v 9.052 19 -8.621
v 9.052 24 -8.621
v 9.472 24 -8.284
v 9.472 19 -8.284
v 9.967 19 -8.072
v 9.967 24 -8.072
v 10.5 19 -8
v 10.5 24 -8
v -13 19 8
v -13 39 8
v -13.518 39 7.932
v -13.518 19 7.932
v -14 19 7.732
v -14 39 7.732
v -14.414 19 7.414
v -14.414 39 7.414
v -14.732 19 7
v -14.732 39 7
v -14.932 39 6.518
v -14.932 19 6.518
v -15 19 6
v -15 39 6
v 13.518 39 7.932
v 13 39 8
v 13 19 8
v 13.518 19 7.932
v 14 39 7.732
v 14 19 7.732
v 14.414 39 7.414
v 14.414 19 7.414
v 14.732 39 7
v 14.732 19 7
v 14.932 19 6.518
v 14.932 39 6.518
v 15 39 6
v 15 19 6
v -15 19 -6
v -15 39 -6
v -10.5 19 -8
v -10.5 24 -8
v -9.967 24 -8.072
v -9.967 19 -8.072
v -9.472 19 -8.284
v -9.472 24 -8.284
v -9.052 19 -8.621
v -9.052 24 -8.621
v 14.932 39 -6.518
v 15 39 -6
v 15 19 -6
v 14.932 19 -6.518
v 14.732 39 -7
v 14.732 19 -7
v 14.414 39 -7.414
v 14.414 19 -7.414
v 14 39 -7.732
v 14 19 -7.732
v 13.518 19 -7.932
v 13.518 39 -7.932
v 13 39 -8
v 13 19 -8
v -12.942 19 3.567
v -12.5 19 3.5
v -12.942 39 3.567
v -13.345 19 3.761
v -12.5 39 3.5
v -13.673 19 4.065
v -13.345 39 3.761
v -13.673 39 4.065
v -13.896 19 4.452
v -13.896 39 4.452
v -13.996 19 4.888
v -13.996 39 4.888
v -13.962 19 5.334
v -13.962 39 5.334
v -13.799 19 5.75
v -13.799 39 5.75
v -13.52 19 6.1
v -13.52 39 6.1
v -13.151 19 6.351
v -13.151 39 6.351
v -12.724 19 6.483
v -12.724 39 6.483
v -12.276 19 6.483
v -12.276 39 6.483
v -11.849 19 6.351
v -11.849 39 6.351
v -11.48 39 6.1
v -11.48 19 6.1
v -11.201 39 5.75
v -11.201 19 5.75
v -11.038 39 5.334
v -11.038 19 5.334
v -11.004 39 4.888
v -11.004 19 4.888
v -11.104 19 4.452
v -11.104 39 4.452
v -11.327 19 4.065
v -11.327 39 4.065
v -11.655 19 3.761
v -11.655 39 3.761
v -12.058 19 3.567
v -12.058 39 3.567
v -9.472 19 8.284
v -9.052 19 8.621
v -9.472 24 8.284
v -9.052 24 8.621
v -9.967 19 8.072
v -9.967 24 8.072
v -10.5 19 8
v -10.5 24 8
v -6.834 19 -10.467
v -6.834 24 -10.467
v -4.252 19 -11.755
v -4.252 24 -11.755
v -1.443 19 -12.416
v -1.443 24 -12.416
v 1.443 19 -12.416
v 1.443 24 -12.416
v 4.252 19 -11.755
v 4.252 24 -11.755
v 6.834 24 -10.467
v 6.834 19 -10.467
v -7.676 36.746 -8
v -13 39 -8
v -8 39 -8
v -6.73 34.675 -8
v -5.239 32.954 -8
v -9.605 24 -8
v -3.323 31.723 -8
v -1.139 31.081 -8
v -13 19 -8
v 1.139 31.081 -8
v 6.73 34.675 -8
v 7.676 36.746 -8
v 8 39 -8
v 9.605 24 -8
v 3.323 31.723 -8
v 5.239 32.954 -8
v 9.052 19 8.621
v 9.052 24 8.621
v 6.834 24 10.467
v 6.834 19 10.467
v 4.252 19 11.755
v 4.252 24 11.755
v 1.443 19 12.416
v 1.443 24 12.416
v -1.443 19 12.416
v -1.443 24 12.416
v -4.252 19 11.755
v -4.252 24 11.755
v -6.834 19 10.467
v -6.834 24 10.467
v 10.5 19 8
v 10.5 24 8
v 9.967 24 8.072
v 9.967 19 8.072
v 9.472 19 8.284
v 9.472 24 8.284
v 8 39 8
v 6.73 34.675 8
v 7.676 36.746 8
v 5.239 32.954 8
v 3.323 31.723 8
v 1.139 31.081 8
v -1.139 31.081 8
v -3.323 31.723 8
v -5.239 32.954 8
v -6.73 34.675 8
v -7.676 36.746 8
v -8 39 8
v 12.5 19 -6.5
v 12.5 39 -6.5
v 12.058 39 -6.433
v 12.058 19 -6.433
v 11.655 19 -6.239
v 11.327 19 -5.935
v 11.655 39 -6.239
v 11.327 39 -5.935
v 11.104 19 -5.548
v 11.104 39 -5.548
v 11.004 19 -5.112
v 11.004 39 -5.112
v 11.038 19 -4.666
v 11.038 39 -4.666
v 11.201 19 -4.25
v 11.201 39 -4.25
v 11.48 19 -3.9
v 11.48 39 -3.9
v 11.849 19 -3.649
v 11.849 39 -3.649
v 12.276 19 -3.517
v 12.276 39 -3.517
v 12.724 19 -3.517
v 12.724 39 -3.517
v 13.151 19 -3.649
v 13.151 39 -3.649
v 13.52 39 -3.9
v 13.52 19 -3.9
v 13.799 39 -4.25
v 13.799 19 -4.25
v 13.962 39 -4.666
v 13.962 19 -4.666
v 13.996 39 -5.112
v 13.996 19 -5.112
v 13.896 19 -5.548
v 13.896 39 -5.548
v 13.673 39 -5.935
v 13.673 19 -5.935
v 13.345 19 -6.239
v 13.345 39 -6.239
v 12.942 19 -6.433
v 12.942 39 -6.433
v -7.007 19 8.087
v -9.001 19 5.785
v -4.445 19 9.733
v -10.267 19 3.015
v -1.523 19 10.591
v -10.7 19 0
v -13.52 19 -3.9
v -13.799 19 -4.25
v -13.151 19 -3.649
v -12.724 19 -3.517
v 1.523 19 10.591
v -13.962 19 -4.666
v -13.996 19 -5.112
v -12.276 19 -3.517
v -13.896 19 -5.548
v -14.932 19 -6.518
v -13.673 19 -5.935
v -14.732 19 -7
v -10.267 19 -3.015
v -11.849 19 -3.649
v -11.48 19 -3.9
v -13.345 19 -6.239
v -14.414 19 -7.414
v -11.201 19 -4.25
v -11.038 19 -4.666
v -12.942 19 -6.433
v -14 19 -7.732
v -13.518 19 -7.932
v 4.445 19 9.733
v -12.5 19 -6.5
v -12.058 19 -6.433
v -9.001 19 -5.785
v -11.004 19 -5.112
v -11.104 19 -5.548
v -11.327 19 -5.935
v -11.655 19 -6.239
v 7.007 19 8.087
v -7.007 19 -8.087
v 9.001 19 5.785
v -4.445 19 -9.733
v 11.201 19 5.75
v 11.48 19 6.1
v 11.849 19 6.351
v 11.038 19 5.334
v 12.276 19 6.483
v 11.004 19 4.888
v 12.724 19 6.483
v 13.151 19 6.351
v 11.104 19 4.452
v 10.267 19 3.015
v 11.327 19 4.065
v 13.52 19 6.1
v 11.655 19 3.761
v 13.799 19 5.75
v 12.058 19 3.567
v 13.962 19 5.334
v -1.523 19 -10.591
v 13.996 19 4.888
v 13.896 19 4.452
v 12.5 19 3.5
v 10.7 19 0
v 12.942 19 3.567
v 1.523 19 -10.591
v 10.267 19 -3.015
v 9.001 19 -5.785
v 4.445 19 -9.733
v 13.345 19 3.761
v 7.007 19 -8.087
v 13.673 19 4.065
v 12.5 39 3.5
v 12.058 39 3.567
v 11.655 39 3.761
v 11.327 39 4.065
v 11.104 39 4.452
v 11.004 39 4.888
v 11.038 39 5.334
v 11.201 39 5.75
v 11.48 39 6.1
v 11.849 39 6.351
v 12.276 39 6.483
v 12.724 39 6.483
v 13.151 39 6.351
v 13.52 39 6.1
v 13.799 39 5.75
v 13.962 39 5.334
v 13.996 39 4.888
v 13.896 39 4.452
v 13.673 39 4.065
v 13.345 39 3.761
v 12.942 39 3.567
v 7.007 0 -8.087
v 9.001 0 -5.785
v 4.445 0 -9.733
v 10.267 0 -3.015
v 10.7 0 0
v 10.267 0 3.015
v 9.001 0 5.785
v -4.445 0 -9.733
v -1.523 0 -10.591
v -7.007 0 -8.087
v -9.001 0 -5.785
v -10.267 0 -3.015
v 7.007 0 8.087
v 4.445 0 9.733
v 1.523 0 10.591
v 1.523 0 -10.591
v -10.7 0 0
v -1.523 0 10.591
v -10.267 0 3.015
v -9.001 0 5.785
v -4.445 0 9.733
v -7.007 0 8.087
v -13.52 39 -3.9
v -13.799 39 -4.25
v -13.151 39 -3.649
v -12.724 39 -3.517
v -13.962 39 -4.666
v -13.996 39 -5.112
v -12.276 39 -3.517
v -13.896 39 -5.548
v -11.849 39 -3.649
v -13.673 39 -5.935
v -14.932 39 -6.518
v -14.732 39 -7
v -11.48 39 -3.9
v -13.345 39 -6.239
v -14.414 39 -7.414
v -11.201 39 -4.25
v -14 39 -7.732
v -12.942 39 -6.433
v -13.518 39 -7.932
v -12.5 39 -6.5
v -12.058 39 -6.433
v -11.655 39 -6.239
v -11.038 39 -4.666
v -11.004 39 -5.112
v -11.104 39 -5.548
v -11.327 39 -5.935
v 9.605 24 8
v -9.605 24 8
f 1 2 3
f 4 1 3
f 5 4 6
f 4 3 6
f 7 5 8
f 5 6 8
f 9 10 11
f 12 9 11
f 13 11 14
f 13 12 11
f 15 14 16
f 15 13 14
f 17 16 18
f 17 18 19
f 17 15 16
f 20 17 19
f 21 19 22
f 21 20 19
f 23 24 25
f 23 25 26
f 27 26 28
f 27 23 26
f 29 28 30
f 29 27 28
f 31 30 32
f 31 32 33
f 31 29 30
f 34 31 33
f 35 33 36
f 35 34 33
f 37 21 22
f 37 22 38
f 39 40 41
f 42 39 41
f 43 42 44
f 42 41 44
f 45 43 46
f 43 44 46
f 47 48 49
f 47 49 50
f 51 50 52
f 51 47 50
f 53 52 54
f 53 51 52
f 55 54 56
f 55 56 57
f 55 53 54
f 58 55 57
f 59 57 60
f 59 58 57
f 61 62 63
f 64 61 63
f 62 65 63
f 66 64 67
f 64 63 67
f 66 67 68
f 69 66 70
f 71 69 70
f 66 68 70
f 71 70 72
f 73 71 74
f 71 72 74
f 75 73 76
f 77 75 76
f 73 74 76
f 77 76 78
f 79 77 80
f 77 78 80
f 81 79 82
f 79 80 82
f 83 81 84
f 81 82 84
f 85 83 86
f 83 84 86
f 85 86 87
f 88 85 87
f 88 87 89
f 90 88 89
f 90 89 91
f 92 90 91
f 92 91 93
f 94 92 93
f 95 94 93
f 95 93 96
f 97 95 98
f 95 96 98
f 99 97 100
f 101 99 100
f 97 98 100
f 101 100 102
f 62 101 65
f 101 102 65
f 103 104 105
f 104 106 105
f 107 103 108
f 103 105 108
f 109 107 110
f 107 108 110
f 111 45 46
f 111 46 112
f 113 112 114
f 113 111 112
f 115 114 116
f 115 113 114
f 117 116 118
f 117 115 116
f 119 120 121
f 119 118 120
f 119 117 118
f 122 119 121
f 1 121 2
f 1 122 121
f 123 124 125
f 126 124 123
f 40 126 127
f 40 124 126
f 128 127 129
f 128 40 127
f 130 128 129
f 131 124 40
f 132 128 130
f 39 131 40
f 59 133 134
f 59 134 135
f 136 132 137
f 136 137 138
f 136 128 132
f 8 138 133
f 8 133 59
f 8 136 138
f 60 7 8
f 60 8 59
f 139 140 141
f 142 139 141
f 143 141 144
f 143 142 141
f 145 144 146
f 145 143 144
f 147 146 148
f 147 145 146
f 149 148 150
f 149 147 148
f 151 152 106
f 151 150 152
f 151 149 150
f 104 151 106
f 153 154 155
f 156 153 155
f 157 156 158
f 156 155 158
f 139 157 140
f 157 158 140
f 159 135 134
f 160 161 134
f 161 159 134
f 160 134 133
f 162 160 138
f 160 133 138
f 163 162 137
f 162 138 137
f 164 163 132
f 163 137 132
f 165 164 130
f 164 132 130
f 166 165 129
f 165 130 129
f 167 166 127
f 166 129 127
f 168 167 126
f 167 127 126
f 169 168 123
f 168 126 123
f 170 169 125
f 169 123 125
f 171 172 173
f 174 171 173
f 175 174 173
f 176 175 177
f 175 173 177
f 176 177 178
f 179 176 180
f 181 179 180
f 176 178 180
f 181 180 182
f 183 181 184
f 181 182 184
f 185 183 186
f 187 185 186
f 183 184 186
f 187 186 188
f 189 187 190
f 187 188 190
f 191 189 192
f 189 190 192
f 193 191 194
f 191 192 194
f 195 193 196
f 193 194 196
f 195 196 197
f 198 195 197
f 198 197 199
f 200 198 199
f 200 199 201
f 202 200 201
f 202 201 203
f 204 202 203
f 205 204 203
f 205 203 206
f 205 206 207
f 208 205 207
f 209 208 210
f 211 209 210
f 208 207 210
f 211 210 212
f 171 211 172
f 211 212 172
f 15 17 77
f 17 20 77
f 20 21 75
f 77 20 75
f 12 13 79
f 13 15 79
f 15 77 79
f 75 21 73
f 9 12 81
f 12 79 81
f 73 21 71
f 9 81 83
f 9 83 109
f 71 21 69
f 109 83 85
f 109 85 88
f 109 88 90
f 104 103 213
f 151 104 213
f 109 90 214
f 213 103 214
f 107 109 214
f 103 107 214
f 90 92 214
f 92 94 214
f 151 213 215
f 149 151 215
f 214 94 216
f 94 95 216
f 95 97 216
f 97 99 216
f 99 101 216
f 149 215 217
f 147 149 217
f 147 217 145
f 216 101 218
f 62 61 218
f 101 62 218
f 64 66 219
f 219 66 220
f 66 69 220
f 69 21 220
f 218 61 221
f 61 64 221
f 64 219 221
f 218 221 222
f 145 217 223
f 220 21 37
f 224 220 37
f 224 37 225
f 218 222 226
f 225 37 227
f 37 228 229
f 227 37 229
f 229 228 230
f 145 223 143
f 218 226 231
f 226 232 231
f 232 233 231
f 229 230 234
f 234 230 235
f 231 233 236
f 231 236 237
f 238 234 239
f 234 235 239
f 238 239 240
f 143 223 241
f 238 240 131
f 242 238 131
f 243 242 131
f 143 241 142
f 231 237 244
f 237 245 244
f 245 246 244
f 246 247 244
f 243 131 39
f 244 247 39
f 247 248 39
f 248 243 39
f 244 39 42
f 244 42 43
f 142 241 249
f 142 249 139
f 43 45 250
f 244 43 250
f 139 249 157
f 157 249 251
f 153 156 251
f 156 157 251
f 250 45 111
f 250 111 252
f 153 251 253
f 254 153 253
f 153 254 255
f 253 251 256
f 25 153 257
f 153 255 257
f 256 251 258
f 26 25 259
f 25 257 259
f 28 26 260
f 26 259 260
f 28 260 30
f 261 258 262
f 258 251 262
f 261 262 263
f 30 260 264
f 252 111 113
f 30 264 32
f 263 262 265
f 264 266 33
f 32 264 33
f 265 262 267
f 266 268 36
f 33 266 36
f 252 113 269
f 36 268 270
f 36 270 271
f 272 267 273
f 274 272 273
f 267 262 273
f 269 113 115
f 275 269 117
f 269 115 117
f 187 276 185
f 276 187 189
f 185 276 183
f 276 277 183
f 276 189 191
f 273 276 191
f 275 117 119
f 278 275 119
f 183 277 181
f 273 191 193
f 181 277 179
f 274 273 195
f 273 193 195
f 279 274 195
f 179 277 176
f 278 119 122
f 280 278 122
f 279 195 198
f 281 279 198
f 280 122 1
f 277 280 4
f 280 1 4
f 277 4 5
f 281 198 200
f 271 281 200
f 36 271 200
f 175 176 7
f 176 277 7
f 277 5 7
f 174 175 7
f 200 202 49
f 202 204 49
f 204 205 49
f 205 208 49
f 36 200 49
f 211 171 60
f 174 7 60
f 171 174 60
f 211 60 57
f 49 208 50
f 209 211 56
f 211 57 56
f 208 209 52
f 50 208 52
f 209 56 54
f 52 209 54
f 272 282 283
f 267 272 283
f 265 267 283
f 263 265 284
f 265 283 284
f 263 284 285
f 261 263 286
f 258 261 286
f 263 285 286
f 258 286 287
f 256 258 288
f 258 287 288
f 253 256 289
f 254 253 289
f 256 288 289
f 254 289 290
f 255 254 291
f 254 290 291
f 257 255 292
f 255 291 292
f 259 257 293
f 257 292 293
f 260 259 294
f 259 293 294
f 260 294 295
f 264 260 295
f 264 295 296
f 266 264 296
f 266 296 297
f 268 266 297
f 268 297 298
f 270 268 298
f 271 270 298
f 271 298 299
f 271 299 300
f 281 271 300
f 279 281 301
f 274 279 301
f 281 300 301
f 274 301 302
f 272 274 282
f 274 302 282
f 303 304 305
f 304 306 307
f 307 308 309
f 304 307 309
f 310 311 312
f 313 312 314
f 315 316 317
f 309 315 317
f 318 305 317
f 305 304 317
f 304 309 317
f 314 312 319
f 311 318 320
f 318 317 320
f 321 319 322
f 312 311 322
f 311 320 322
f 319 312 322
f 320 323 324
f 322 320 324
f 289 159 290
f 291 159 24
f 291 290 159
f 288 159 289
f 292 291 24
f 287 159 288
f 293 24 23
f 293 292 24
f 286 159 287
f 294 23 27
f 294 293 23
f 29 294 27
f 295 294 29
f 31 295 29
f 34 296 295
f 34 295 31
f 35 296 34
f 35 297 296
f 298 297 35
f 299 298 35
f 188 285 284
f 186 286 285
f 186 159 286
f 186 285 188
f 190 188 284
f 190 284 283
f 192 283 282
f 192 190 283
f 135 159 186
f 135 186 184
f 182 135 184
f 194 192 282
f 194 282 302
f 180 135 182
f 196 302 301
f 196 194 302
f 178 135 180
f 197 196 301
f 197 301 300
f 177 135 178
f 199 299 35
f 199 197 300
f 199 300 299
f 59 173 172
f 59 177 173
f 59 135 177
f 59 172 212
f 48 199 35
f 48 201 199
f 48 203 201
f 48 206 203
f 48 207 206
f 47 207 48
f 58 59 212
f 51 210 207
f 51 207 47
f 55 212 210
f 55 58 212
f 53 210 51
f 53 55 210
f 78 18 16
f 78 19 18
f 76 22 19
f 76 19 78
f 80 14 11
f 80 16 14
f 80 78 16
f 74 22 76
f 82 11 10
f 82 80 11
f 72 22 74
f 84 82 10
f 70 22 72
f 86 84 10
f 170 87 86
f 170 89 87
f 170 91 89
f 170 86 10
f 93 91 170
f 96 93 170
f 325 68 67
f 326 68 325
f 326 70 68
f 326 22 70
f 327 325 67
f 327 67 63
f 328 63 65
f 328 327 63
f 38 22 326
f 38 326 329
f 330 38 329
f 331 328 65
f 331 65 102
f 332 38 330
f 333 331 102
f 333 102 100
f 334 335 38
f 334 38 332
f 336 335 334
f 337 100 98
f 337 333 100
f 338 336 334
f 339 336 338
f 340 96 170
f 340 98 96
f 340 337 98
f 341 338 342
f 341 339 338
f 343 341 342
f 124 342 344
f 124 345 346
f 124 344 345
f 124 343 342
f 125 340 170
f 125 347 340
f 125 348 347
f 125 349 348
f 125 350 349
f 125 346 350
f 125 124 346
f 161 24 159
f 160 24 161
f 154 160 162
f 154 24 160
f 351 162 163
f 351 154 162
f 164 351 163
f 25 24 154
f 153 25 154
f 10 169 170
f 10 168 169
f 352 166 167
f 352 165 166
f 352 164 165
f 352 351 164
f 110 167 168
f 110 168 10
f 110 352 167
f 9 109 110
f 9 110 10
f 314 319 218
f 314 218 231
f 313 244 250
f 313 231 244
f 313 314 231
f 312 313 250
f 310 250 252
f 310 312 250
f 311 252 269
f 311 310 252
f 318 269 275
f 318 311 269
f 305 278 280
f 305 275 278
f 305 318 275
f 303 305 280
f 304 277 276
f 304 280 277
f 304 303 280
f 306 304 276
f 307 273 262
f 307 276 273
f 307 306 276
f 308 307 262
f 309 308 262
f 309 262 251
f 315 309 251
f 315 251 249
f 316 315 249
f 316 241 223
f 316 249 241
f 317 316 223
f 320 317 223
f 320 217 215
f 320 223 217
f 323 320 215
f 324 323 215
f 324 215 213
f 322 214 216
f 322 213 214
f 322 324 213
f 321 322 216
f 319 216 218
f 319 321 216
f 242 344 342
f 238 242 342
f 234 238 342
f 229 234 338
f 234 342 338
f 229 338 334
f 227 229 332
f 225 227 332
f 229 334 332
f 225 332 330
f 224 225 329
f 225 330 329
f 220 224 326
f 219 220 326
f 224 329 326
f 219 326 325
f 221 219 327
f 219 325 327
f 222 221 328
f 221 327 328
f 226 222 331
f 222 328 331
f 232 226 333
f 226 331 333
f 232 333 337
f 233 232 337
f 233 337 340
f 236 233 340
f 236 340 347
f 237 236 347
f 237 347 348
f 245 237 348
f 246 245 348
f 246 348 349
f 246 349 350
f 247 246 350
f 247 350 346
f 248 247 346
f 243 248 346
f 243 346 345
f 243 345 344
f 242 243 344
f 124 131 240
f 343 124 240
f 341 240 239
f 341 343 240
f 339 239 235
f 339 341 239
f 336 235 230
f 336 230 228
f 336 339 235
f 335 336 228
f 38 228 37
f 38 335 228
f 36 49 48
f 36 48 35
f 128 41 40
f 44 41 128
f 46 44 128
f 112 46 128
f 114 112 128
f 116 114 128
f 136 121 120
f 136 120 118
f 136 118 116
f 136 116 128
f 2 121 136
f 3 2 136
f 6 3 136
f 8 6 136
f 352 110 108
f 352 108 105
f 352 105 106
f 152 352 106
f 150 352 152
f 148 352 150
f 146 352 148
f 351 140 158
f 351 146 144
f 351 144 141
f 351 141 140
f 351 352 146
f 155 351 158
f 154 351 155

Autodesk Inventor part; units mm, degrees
ref_plane "YZ Plane" through (0, 0, 0) normal (1, 0, 0) x (0, 1, 0)
ref_plane "XZ Plane" through (0, 0, 0) normal (0, 1, 0) x (-1, 0, 0)
ref_plane "XY Plane" through (0, 0, 0) normal (0, 0, 1) x (1, 0, 0)
sketch "Sketch1" plane through (0, 0, 0) normal (0, 1, 0) x (-1, 0, 0)
  circle A0 centre (0, 0) radius 10.7
  dimension "d0" = 21.4
extrude "Extrusion1" add sketch "Sketch1" along normal blind 19
sketch "Sketch2" plane through (0, 19, 0) normal (0, 1, 0) x (1, 0, 0)
  circle A0 centre (0, 0) radius 12.5
  circle A1 centre (0, 0) radius 10.7 projected
  line L0 (-15, 8) -> (15, 8)
  line L1 (15, 8) -> (15, -8)
  line L2 (15, -8) -> (-15, -8)
  line L3 (-15, -8) -> (-15, 8)
  line L4 (0, 0) -> (1.899, 0)
  line L5 (0, 0) -> (0, 1.5989)
  point P0 (-12.5, 0)
  point P1 (9.6047, -8)
  point P2 (-9.6047, 8)
  point P3 (12.5, 0)
  point P4 (-9.6047, -8)
  point P5 (9.6047, 8)
  dimension "d9" = 25
  dimension "d10" = 21.4
  dimension "d14" = 30
  dimension "d15" = 16
extrude "Extrusion2" add sketch "Sketch2" along normal blind 5
sketch "Sketch3" plane through (0, 0, 0) normal (0, 0, 1) x (1, 0, 0)
  line L0 (10.7, 0) -> (-10.7, 0) projected
  line L1 (9.6047, 19) -> (15, 19) projected
  line L2 (15, 19) -> (15, 24) projected
  line L3 (-15, 24) -> (-9.6047, 24) projected
  line L4 (-15, 19) -> (-15, 24) projected
  circle A0 centre (0, 39) radius 15
  circle A1 centre (0, 39) radius 8
  line L5 (-15, 19) -> (-15, 24) projected
  line L6 (-15, 39) -> (-15, 24)
  line L7 (15, 39) -> (15, 24)
  line L8 (-15, 39) -> (15, 39)
  line L9 (9.6047, 24) -> (15, 24) projected
  line L10 (9.6047, 19) -> (9.6047, 24) projected
  line L11 (-15, 19) -> (-9.6047, 19) projected
  line L12 (-9.6047, 19) -> (-9.6047, 24) projected
  line L13 (-15, 24) -> (15, 24)
  point P0 (0, 0)
  point P1 (-8, 19)
  point P2 (8, 19)
  point P3 (10.7, 19)
  point P4 (-10.7, 19)
  point P5 (8, 39)
  point P6 (-8, 39)
  dimension "d16" = 30
  dimension "d17" = 30
  dimension "d18" = 16
extrude "Extrusion3" add sketch "Sketch3" along normal mid plane 16 contours L13 A0 L7 L9 | L13 L3 L6 A0 | A0 L8 A1 picked at (-12.5413, 37.8874)
sketch "Sketch4" plane through (0, 19, 0) normal (0, -1, 0) x (1, 0, 0)
  arc A0 (-9.6047, -8) -> (9.6047, -8) centre (0, 0) ccw projected
  line L0 (15, -8) -> (9.6047, -8) projected
  line L1 (15, 8) -> (15, -8) projected
  line L2 (9.6047, 8) -> (15, 8) projected
  arc A1 (9.6047, 8) -> (-9.6047, 8) centre (0, 0) ccw projected
  line L3 (-15, 8) -> (-9.6047, 8) projected
  line L4 (-15, -8) -> (-15, 8) projected
  line L5 (-9.6047, -8) -> (-15, -8) projected
  circle A2 centre (0, 0) radius 10.7 projected
  line L6 (12.5, 5) -> (-12.5, 5)
  line L7 (-12.5, 5) -> (-12.5, -5)
  line L8 (-12.5, -5) -> (12.5, -5)
  line L9 (12.5, -5) -> (12.5, 5)
  line L10 (0, 0) -> (0, 1.5128)
  line L11 (0, 0) -> (1.2888, 0)
  dimension "d19" = 10
  dimension "d20" = 25
hole "Hole1" at (12.5, 19, 5) at (12.5, 19, -5) at (-12.5, 19, -5) at (-12.5, 19, 5) direction (0, 1, 0) diameter 3 end through all
fillet "Fillet1" radius 2 8 edges at (-15, 29, 8) (15, 29, 8) (15, 29, -8) (-15, 29, -8) (9.6047, 21.5, 8) (-9.6047, 21.5, 8) (9.6047, 21.5, -8) (-9.6047, 21.5, -8)
equation "\"d17\" = d16"
properties part number "base1" material "PVC-Piping"
